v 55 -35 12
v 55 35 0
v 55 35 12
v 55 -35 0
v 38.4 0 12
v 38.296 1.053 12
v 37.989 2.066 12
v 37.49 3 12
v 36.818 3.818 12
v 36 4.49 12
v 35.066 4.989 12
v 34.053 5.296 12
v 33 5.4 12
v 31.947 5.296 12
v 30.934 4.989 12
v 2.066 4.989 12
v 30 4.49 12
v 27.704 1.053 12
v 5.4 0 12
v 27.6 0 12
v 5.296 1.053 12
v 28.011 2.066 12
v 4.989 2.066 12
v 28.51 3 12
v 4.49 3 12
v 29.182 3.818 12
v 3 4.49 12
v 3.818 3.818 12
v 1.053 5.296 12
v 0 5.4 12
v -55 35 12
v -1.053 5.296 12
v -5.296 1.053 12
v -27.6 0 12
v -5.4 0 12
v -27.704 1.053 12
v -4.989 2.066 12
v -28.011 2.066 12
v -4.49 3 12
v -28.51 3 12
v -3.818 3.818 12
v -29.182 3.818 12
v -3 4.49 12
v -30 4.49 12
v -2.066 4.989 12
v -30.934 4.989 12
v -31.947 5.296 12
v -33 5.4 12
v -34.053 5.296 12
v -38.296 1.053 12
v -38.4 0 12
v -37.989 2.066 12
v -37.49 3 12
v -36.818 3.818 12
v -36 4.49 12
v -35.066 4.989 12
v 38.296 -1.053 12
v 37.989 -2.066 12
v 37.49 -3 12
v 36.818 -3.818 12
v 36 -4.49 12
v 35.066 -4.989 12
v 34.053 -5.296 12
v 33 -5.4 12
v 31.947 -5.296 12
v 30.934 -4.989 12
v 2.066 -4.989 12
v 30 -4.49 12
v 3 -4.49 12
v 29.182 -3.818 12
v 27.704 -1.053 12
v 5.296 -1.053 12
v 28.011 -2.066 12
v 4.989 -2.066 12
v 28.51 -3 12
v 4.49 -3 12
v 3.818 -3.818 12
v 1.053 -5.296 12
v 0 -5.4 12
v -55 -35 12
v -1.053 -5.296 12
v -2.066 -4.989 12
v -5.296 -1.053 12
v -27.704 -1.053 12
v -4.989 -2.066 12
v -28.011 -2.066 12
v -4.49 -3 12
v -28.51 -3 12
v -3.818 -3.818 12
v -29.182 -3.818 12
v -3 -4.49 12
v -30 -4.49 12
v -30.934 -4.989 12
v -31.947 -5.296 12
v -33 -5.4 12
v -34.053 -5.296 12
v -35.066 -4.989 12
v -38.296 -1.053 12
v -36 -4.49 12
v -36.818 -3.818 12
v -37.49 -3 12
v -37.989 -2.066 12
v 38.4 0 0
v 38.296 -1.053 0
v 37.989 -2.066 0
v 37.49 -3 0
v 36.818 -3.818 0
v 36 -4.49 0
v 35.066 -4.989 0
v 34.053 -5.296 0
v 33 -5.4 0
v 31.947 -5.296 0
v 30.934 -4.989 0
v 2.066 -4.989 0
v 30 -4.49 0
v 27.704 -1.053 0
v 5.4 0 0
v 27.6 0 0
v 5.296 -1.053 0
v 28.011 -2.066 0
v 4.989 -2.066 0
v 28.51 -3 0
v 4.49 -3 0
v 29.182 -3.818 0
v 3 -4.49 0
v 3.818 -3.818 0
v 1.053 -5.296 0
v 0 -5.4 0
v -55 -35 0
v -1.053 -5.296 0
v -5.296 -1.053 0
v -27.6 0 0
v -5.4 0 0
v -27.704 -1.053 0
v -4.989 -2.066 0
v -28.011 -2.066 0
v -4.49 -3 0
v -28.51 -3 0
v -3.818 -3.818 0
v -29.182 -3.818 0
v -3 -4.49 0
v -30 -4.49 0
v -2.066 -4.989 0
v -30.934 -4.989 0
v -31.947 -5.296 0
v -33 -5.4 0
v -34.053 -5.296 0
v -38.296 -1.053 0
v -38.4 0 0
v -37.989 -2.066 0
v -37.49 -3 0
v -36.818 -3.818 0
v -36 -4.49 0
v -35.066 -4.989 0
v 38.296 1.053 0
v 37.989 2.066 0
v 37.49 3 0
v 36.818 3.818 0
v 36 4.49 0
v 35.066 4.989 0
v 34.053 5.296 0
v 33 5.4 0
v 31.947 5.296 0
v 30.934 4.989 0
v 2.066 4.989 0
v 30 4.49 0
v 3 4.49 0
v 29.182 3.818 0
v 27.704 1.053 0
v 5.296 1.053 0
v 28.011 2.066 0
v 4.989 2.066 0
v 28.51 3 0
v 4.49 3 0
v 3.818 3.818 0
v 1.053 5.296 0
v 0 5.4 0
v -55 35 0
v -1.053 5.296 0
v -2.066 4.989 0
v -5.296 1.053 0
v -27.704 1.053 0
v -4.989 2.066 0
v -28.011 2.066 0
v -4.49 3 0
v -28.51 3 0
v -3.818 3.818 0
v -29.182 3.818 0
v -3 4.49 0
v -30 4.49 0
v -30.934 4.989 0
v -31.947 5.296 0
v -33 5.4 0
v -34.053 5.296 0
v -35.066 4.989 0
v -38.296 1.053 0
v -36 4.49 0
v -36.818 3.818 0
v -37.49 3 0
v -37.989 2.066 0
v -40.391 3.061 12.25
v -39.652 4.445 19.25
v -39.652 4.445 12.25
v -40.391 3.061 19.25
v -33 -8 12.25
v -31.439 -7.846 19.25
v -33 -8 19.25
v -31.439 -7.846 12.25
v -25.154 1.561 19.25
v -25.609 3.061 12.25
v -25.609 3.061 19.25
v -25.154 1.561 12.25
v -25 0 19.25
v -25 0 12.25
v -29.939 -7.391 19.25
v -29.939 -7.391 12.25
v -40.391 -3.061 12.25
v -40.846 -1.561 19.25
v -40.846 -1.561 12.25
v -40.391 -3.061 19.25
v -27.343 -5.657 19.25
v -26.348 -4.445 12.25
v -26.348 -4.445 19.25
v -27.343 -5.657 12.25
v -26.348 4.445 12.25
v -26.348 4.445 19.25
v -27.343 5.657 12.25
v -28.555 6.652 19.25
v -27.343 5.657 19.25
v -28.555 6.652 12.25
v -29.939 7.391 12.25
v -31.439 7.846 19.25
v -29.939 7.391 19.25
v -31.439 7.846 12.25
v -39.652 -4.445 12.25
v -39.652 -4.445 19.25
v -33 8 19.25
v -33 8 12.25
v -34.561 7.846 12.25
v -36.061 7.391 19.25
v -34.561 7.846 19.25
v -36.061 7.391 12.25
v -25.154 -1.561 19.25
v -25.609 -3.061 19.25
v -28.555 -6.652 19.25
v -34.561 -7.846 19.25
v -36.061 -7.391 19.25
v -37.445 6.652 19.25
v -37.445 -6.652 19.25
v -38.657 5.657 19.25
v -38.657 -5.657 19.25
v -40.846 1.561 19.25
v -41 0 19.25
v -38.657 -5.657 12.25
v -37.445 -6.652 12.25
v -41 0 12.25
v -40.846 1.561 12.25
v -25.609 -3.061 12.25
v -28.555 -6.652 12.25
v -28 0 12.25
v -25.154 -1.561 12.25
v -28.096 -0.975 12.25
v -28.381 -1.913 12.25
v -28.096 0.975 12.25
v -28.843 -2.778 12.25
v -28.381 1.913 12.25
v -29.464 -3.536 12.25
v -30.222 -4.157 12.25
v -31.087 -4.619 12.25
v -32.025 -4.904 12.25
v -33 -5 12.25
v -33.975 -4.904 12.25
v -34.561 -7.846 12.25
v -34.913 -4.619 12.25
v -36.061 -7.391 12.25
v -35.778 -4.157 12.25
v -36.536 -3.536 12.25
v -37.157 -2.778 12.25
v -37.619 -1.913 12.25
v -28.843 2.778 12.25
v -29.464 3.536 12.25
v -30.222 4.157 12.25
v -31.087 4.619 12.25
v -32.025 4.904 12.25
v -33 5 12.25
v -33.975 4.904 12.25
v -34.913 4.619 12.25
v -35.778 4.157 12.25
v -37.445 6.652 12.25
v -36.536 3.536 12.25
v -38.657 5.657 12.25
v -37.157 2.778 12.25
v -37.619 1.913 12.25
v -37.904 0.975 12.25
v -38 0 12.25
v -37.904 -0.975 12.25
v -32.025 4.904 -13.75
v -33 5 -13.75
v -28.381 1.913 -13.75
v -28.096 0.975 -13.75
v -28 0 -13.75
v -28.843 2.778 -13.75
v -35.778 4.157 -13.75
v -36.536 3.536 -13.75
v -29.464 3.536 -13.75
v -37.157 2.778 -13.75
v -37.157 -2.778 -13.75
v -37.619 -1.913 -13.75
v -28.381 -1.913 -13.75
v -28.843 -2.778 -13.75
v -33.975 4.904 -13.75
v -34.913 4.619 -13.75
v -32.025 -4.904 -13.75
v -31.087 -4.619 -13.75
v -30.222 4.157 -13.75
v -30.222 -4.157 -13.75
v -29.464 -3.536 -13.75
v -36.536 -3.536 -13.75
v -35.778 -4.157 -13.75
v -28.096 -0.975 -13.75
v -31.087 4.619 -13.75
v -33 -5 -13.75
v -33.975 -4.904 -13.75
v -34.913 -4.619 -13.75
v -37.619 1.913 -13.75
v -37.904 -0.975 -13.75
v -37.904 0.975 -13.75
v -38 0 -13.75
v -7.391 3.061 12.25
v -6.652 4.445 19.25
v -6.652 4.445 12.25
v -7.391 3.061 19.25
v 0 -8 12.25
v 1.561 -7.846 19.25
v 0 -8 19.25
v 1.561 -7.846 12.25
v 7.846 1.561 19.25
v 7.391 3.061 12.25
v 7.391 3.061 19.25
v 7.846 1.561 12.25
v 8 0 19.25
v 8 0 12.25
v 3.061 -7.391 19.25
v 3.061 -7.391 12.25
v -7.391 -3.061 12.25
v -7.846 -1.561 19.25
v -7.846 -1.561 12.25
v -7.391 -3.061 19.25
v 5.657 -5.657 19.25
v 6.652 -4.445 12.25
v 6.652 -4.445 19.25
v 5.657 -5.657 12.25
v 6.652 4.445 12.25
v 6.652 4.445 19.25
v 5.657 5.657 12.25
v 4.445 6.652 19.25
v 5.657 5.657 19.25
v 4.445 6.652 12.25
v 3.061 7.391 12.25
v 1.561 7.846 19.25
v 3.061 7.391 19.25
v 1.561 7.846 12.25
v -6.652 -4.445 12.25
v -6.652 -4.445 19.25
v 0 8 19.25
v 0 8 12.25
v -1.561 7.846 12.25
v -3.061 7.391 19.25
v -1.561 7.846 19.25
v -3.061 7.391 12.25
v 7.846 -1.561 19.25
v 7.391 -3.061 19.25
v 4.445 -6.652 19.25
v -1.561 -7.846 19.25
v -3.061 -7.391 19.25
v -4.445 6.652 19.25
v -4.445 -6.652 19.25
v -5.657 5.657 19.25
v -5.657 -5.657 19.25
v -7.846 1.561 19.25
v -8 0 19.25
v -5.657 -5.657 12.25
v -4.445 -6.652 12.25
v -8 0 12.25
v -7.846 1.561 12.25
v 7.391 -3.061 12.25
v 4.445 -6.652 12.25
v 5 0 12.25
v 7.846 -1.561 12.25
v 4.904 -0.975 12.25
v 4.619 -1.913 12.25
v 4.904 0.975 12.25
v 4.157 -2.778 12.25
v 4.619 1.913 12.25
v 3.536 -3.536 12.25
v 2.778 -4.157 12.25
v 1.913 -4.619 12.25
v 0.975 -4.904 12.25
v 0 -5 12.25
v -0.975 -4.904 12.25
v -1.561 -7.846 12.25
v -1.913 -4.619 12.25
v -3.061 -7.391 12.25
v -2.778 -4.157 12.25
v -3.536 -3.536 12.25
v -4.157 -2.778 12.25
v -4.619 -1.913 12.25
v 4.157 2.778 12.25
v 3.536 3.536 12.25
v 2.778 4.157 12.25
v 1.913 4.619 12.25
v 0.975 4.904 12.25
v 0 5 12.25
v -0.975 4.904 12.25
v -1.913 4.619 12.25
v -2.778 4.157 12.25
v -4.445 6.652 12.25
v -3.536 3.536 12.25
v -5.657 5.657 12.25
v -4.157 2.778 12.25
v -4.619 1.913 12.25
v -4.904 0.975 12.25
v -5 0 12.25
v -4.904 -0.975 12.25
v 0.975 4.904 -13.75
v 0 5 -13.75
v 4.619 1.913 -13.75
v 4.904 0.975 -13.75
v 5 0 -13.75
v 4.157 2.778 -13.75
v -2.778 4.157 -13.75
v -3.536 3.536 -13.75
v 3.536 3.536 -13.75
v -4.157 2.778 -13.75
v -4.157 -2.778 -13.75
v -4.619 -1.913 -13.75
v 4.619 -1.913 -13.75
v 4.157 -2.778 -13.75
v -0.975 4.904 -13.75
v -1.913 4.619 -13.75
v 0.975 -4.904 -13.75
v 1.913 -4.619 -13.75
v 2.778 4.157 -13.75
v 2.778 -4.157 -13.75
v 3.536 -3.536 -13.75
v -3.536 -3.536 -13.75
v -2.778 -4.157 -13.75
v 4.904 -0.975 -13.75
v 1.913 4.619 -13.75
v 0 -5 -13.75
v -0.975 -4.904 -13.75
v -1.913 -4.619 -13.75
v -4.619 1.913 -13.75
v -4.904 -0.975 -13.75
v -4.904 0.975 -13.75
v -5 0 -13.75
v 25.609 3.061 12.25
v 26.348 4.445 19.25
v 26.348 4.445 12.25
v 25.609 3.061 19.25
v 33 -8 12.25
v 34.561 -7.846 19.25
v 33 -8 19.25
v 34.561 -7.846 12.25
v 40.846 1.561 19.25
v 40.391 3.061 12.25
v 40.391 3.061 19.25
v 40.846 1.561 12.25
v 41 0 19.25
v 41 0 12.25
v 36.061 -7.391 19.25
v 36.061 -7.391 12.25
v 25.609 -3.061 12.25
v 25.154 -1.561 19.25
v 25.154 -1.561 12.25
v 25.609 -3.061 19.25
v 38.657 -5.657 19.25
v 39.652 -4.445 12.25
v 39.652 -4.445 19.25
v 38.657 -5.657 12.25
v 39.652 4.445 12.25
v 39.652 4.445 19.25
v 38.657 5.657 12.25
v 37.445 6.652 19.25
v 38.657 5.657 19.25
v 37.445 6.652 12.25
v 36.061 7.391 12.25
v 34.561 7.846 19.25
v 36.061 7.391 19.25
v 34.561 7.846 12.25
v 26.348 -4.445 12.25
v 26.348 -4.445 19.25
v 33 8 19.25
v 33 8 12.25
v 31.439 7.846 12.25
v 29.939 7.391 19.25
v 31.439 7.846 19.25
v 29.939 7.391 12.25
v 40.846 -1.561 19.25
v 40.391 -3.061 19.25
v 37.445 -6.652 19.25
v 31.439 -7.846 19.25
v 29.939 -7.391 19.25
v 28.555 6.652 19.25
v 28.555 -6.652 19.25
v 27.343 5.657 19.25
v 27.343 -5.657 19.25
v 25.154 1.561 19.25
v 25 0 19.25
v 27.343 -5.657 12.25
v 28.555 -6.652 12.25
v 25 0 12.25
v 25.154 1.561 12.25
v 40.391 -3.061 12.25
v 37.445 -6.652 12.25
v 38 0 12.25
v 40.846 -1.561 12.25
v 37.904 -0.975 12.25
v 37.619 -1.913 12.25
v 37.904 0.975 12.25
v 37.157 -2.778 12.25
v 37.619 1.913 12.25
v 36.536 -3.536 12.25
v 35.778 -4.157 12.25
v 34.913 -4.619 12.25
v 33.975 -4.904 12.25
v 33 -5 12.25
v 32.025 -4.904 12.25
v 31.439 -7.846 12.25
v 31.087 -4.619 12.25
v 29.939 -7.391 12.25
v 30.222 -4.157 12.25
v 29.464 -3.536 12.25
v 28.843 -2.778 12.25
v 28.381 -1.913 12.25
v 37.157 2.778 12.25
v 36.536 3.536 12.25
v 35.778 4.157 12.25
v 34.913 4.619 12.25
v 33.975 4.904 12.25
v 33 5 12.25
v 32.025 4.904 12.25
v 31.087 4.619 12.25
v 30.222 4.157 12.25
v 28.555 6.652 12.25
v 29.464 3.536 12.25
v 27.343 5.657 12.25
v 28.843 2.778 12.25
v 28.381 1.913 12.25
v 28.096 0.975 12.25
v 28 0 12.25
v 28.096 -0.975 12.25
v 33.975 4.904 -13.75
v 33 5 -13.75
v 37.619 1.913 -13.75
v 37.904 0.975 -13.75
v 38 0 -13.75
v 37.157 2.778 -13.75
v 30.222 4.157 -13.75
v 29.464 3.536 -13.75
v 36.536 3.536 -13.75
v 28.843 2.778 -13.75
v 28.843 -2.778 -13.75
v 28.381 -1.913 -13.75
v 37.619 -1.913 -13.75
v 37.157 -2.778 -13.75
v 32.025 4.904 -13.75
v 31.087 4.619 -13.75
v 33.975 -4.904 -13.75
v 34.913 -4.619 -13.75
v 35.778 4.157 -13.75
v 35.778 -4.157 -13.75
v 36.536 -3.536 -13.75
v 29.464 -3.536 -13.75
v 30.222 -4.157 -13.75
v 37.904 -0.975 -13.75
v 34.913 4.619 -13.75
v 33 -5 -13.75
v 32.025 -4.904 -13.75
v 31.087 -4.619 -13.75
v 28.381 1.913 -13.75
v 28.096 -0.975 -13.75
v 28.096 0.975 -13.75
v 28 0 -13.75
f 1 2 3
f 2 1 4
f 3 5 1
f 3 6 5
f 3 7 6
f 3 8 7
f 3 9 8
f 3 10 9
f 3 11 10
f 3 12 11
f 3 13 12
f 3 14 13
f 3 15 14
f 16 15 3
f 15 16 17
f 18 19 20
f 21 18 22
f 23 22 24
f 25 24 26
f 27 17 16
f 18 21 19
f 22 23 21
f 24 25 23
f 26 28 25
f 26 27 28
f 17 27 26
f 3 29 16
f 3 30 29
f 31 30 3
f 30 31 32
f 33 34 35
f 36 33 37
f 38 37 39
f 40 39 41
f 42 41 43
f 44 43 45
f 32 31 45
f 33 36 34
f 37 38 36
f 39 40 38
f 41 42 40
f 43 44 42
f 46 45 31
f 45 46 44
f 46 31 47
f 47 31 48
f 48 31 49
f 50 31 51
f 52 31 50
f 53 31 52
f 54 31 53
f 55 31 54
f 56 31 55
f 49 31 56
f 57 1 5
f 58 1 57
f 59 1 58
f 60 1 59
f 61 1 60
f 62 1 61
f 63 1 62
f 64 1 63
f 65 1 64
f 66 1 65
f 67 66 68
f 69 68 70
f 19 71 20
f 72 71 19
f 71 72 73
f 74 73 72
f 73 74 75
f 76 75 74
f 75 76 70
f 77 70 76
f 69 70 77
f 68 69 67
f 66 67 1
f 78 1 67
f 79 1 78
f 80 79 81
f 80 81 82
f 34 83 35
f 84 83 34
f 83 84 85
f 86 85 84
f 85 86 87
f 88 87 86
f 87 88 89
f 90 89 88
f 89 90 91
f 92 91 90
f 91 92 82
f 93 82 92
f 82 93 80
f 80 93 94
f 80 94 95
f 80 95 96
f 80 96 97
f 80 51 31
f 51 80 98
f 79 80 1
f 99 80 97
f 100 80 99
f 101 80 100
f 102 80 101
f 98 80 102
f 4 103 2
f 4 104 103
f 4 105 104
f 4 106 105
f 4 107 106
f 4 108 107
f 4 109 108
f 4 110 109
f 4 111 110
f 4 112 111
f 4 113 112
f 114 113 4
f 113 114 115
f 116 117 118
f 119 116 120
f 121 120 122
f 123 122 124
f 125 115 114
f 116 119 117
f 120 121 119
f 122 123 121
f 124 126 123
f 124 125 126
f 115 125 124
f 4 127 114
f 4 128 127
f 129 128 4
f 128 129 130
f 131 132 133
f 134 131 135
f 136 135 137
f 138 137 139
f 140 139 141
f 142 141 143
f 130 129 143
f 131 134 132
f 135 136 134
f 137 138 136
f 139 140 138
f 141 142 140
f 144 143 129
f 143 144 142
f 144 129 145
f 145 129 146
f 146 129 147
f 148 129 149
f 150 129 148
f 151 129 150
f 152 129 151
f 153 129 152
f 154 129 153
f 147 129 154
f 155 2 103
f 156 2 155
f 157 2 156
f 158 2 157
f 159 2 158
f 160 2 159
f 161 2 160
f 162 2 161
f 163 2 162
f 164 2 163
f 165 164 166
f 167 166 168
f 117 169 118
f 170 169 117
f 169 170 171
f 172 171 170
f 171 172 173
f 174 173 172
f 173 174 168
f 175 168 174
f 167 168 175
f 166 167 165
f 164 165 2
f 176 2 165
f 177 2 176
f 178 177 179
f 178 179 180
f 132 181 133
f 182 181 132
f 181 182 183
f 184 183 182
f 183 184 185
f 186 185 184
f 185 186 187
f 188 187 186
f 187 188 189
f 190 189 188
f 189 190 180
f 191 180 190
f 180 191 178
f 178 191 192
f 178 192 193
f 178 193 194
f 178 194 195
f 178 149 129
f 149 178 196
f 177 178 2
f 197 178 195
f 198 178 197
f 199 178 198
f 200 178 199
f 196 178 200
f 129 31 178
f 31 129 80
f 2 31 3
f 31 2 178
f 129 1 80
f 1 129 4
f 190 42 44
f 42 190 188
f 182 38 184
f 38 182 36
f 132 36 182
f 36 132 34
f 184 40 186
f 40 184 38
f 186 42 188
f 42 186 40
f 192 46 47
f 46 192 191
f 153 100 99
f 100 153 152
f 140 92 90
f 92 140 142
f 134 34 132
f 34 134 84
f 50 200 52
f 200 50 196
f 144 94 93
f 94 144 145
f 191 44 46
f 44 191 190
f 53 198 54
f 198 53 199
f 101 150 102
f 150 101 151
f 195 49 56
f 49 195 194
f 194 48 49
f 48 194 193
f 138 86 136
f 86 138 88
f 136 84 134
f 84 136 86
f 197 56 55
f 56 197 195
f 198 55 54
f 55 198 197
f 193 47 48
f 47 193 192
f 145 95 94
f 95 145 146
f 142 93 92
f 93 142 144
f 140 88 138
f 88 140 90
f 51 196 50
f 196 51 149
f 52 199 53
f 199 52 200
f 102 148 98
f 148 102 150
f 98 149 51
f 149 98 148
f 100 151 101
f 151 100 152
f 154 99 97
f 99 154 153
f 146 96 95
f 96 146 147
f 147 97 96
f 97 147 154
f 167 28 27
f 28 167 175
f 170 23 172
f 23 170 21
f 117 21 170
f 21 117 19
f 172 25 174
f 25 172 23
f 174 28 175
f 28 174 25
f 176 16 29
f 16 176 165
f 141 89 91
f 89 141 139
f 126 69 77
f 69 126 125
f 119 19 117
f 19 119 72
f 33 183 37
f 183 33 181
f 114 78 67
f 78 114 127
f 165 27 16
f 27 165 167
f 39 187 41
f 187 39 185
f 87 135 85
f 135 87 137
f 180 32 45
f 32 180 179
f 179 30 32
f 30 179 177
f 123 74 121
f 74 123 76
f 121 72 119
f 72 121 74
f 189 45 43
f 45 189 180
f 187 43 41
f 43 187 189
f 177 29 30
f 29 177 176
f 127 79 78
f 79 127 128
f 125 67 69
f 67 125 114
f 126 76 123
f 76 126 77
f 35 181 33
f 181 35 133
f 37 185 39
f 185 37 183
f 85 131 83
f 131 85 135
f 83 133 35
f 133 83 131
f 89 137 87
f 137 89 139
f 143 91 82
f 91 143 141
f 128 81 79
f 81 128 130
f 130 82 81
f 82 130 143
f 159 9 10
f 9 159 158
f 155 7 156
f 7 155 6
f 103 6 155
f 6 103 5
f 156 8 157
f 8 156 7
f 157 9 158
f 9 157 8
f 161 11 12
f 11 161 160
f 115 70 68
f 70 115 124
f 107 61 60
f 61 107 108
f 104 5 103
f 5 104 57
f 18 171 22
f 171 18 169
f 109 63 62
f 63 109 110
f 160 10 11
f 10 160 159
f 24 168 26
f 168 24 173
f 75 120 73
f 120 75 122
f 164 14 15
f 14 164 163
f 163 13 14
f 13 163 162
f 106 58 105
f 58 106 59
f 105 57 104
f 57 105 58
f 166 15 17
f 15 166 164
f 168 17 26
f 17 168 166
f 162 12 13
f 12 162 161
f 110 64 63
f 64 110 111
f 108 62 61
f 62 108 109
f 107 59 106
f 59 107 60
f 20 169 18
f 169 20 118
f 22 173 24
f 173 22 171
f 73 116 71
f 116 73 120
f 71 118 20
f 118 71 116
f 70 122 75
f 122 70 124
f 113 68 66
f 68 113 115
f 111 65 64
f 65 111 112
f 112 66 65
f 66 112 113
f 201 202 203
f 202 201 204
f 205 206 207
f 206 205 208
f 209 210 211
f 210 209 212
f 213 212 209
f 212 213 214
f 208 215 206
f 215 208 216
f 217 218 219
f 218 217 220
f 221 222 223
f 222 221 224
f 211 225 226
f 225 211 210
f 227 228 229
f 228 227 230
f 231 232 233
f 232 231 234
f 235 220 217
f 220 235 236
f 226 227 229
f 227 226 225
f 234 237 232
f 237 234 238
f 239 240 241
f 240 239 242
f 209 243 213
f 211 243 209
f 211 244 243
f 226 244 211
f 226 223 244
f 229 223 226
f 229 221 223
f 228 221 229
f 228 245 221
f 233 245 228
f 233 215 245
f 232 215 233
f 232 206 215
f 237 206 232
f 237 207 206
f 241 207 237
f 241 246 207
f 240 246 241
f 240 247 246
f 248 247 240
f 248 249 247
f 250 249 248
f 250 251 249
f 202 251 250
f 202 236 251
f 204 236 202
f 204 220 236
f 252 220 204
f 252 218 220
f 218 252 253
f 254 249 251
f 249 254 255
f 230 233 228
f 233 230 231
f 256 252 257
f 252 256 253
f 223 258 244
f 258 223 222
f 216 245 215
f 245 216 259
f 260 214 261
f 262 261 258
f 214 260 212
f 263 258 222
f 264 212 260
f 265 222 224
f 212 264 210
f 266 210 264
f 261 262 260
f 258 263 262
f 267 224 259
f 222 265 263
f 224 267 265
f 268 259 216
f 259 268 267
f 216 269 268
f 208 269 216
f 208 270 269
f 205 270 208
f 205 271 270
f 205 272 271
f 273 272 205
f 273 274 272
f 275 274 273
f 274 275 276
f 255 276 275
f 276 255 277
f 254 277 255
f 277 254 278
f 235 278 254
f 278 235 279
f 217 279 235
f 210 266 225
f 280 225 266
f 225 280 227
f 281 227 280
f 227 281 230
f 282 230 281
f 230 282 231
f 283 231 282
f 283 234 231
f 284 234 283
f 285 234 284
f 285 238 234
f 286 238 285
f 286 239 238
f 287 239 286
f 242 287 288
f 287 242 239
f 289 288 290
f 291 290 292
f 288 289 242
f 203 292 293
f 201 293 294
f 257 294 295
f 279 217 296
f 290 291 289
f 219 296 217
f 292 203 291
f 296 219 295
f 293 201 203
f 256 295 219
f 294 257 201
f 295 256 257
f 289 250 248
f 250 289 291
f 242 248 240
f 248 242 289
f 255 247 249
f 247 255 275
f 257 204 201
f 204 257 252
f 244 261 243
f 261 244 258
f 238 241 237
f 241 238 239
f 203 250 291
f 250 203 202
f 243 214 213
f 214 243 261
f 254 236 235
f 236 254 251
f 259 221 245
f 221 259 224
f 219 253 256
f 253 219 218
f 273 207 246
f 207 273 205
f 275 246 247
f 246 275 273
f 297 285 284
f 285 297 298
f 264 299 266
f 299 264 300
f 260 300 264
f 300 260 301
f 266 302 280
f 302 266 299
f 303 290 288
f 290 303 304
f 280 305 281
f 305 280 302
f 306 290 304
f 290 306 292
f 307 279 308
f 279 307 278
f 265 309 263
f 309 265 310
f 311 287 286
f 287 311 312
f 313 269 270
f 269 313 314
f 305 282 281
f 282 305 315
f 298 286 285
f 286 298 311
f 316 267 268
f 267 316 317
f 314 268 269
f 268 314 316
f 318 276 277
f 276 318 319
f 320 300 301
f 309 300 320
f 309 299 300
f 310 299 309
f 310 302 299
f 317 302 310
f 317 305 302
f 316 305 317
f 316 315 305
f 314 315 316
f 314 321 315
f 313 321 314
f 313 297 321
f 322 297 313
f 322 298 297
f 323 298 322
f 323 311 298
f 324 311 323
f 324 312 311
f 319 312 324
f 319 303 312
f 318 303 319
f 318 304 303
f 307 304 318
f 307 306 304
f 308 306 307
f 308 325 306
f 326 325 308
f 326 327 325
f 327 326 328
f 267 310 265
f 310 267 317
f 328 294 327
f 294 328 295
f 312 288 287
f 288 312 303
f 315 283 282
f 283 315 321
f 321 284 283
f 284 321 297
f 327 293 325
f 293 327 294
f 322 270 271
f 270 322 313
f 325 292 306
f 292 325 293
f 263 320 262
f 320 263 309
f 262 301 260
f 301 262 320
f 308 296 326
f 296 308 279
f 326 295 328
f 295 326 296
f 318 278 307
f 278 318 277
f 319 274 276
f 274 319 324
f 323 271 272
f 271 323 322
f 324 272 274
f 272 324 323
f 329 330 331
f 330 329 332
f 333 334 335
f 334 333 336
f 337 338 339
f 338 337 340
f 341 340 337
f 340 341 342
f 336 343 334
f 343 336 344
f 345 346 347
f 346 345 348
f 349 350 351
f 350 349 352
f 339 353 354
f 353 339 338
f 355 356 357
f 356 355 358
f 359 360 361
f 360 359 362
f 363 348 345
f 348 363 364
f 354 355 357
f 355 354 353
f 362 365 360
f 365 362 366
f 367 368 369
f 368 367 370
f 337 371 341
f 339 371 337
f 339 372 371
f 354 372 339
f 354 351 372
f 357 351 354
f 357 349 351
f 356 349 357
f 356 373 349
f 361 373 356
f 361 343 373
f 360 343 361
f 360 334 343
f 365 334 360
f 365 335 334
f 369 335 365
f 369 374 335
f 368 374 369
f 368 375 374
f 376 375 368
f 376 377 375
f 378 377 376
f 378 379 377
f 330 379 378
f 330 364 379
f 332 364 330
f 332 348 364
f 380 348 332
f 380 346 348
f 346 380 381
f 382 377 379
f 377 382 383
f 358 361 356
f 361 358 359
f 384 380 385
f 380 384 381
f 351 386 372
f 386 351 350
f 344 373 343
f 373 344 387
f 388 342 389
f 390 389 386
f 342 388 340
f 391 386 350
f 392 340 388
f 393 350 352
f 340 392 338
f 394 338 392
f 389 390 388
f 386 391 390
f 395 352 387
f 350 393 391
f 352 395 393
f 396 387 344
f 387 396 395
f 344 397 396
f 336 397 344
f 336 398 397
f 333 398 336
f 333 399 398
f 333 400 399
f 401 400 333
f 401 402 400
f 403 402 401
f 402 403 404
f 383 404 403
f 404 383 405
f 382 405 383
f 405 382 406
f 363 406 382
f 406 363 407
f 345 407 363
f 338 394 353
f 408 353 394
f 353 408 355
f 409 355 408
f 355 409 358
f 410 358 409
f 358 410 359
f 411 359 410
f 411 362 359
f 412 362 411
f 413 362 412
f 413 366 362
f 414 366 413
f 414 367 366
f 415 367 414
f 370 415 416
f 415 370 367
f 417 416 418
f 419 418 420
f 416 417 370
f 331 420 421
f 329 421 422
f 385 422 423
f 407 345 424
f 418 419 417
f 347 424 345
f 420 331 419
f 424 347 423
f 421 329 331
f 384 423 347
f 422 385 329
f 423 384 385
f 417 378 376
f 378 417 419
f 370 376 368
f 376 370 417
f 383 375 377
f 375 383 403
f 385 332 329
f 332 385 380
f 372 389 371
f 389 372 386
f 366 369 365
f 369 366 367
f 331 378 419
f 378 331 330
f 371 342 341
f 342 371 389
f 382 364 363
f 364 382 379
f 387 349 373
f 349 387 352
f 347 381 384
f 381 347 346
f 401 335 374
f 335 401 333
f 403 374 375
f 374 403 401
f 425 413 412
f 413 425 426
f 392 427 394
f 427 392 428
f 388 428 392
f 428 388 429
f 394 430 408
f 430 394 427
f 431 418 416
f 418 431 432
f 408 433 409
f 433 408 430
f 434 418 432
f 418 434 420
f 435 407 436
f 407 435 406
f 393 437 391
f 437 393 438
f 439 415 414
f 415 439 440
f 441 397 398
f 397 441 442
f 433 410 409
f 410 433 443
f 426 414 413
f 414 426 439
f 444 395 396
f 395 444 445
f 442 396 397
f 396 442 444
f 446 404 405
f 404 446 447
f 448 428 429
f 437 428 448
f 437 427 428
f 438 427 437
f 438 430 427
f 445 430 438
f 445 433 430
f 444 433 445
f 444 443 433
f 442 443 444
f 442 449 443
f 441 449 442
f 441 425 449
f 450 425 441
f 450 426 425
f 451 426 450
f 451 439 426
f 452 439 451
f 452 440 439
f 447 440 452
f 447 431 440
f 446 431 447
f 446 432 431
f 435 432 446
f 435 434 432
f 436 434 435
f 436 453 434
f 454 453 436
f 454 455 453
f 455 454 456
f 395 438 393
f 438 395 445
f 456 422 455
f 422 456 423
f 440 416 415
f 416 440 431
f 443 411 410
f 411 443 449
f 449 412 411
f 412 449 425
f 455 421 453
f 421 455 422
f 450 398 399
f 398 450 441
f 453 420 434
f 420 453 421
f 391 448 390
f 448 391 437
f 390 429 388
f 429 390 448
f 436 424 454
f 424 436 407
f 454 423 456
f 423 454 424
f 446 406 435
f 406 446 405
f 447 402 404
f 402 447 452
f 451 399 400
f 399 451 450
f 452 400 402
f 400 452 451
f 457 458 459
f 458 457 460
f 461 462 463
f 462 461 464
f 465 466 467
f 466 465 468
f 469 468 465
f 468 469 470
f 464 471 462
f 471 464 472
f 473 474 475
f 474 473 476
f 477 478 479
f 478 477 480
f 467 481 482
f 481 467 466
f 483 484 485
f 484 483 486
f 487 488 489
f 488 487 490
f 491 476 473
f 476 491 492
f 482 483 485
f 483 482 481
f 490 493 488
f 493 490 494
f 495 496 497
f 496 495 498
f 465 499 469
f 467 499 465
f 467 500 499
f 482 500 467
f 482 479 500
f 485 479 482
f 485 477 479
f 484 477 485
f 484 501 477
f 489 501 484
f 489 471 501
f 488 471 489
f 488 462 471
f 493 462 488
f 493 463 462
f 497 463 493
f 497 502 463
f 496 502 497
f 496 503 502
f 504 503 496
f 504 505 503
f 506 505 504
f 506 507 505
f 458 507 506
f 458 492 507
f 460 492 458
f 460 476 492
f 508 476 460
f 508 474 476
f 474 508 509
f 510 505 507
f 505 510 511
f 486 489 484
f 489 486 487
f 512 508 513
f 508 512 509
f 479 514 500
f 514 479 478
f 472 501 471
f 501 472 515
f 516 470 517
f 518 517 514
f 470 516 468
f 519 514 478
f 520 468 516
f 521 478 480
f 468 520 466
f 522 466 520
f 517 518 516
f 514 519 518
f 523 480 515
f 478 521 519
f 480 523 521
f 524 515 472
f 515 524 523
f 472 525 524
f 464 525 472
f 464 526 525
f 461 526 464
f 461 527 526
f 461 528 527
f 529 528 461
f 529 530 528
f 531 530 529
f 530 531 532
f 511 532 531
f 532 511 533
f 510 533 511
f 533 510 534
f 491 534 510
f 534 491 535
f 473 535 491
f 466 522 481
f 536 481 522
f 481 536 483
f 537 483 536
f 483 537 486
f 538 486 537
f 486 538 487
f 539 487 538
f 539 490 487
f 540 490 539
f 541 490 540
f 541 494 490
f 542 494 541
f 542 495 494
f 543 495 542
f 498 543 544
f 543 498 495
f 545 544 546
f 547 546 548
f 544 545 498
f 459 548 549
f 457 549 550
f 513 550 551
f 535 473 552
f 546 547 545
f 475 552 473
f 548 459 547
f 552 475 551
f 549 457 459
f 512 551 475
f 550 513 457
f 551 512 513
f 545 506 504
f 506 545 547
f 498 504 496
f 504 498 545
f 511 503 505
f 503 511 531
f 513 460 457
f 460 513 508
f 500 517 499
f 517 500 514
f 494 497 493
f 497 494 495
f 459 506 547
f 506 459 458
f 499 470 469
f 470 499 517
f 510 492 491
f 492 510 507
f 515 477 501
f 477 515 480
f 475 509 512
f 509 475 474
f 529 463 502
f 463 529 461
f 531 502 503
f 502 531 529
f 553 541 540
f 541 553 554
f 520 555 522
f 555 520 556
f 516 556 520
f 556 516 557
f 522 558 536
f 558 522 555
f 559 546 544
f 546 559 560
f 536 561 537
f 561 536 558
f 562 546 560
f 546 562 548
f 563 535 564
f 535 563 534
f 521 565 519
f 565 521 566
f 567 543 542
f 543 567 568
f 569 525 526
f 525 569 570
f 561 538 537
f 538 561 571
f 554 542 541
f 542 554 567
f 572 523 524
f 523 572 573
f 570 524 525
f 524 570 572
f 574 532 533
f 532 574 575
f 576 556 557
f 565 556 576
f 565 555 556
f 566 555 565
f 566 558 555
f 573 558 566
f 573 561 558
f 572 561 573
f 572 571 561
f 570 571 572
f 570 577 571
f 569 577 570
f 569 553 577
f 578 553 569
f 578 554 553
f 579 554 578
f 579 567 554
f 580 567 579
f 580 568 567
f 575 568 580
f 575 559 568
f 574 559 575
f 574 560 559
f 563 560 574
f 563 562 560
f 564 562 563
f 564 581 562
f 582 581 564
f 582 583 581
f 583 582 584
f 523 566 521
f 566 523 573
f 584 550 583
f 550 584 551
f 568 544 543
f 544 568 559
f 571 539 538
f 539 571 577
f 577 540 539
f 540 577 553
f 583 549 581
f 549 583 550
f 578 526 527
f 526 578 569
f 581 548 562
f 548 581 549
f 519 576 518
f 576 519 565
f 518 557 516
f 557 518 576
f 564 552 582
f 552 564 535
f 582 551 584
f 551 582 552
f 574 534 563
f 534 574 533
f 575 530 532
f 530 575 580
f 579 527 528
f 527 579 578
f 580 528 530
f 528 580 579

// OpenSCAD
$fn = 32;

// ------------------------------------------------------------------------
// Bolted plate: 110 x 70 x 12 mm plate, 3 fasteners
// Every part is its own module, assembly() places them once.
// ------------------------------------------------------------------------

// --- part 1 ---
module plate() {
  difference() {
    translate([-55, -35, 0]) cube([110, 70, 12]);
    translate([-33, 0, -1]) cylinder(h = 14, d = 10.8);
    translate([0, 0, -1]) cylinder(h = 14, d = 10.8);
    translate([33, 0, -1]) cylinder(h = 14, d = 10.8);
  }
}

// --- part 2 ---
module bolt1() {
  cylinder(h = 7, d = 16);
  translate([0, 0, -26]) cylinder(h = 26, d = 10);
}

// --- part 3 ---
module bolt2() {
  cylinder(h = 7, d = 16);
  translate([0, 0, -26]) cylinder(h = 26, d = 10);
}

// --- part 4 ---
module bolt3() {
  cylinder(h = 7, d = 16);
  translate([0, 0, -26]) cylinder(h = 26, d = 10);
}

// --- assembly ---
module assembly() {
  translate([0, 0, 0]) rotate([0, 0, 0]) plate();
  translate([-33, 0, 12.25]) rotate([0, 0, 0]) bolt1();
  translate([0, 0, 12.25]) rotate([0, 0, 0]) bolt2();
  translate([33, 0, 12.25]) rotate([0, 0, 0]) bolt3();
}

assembly();
